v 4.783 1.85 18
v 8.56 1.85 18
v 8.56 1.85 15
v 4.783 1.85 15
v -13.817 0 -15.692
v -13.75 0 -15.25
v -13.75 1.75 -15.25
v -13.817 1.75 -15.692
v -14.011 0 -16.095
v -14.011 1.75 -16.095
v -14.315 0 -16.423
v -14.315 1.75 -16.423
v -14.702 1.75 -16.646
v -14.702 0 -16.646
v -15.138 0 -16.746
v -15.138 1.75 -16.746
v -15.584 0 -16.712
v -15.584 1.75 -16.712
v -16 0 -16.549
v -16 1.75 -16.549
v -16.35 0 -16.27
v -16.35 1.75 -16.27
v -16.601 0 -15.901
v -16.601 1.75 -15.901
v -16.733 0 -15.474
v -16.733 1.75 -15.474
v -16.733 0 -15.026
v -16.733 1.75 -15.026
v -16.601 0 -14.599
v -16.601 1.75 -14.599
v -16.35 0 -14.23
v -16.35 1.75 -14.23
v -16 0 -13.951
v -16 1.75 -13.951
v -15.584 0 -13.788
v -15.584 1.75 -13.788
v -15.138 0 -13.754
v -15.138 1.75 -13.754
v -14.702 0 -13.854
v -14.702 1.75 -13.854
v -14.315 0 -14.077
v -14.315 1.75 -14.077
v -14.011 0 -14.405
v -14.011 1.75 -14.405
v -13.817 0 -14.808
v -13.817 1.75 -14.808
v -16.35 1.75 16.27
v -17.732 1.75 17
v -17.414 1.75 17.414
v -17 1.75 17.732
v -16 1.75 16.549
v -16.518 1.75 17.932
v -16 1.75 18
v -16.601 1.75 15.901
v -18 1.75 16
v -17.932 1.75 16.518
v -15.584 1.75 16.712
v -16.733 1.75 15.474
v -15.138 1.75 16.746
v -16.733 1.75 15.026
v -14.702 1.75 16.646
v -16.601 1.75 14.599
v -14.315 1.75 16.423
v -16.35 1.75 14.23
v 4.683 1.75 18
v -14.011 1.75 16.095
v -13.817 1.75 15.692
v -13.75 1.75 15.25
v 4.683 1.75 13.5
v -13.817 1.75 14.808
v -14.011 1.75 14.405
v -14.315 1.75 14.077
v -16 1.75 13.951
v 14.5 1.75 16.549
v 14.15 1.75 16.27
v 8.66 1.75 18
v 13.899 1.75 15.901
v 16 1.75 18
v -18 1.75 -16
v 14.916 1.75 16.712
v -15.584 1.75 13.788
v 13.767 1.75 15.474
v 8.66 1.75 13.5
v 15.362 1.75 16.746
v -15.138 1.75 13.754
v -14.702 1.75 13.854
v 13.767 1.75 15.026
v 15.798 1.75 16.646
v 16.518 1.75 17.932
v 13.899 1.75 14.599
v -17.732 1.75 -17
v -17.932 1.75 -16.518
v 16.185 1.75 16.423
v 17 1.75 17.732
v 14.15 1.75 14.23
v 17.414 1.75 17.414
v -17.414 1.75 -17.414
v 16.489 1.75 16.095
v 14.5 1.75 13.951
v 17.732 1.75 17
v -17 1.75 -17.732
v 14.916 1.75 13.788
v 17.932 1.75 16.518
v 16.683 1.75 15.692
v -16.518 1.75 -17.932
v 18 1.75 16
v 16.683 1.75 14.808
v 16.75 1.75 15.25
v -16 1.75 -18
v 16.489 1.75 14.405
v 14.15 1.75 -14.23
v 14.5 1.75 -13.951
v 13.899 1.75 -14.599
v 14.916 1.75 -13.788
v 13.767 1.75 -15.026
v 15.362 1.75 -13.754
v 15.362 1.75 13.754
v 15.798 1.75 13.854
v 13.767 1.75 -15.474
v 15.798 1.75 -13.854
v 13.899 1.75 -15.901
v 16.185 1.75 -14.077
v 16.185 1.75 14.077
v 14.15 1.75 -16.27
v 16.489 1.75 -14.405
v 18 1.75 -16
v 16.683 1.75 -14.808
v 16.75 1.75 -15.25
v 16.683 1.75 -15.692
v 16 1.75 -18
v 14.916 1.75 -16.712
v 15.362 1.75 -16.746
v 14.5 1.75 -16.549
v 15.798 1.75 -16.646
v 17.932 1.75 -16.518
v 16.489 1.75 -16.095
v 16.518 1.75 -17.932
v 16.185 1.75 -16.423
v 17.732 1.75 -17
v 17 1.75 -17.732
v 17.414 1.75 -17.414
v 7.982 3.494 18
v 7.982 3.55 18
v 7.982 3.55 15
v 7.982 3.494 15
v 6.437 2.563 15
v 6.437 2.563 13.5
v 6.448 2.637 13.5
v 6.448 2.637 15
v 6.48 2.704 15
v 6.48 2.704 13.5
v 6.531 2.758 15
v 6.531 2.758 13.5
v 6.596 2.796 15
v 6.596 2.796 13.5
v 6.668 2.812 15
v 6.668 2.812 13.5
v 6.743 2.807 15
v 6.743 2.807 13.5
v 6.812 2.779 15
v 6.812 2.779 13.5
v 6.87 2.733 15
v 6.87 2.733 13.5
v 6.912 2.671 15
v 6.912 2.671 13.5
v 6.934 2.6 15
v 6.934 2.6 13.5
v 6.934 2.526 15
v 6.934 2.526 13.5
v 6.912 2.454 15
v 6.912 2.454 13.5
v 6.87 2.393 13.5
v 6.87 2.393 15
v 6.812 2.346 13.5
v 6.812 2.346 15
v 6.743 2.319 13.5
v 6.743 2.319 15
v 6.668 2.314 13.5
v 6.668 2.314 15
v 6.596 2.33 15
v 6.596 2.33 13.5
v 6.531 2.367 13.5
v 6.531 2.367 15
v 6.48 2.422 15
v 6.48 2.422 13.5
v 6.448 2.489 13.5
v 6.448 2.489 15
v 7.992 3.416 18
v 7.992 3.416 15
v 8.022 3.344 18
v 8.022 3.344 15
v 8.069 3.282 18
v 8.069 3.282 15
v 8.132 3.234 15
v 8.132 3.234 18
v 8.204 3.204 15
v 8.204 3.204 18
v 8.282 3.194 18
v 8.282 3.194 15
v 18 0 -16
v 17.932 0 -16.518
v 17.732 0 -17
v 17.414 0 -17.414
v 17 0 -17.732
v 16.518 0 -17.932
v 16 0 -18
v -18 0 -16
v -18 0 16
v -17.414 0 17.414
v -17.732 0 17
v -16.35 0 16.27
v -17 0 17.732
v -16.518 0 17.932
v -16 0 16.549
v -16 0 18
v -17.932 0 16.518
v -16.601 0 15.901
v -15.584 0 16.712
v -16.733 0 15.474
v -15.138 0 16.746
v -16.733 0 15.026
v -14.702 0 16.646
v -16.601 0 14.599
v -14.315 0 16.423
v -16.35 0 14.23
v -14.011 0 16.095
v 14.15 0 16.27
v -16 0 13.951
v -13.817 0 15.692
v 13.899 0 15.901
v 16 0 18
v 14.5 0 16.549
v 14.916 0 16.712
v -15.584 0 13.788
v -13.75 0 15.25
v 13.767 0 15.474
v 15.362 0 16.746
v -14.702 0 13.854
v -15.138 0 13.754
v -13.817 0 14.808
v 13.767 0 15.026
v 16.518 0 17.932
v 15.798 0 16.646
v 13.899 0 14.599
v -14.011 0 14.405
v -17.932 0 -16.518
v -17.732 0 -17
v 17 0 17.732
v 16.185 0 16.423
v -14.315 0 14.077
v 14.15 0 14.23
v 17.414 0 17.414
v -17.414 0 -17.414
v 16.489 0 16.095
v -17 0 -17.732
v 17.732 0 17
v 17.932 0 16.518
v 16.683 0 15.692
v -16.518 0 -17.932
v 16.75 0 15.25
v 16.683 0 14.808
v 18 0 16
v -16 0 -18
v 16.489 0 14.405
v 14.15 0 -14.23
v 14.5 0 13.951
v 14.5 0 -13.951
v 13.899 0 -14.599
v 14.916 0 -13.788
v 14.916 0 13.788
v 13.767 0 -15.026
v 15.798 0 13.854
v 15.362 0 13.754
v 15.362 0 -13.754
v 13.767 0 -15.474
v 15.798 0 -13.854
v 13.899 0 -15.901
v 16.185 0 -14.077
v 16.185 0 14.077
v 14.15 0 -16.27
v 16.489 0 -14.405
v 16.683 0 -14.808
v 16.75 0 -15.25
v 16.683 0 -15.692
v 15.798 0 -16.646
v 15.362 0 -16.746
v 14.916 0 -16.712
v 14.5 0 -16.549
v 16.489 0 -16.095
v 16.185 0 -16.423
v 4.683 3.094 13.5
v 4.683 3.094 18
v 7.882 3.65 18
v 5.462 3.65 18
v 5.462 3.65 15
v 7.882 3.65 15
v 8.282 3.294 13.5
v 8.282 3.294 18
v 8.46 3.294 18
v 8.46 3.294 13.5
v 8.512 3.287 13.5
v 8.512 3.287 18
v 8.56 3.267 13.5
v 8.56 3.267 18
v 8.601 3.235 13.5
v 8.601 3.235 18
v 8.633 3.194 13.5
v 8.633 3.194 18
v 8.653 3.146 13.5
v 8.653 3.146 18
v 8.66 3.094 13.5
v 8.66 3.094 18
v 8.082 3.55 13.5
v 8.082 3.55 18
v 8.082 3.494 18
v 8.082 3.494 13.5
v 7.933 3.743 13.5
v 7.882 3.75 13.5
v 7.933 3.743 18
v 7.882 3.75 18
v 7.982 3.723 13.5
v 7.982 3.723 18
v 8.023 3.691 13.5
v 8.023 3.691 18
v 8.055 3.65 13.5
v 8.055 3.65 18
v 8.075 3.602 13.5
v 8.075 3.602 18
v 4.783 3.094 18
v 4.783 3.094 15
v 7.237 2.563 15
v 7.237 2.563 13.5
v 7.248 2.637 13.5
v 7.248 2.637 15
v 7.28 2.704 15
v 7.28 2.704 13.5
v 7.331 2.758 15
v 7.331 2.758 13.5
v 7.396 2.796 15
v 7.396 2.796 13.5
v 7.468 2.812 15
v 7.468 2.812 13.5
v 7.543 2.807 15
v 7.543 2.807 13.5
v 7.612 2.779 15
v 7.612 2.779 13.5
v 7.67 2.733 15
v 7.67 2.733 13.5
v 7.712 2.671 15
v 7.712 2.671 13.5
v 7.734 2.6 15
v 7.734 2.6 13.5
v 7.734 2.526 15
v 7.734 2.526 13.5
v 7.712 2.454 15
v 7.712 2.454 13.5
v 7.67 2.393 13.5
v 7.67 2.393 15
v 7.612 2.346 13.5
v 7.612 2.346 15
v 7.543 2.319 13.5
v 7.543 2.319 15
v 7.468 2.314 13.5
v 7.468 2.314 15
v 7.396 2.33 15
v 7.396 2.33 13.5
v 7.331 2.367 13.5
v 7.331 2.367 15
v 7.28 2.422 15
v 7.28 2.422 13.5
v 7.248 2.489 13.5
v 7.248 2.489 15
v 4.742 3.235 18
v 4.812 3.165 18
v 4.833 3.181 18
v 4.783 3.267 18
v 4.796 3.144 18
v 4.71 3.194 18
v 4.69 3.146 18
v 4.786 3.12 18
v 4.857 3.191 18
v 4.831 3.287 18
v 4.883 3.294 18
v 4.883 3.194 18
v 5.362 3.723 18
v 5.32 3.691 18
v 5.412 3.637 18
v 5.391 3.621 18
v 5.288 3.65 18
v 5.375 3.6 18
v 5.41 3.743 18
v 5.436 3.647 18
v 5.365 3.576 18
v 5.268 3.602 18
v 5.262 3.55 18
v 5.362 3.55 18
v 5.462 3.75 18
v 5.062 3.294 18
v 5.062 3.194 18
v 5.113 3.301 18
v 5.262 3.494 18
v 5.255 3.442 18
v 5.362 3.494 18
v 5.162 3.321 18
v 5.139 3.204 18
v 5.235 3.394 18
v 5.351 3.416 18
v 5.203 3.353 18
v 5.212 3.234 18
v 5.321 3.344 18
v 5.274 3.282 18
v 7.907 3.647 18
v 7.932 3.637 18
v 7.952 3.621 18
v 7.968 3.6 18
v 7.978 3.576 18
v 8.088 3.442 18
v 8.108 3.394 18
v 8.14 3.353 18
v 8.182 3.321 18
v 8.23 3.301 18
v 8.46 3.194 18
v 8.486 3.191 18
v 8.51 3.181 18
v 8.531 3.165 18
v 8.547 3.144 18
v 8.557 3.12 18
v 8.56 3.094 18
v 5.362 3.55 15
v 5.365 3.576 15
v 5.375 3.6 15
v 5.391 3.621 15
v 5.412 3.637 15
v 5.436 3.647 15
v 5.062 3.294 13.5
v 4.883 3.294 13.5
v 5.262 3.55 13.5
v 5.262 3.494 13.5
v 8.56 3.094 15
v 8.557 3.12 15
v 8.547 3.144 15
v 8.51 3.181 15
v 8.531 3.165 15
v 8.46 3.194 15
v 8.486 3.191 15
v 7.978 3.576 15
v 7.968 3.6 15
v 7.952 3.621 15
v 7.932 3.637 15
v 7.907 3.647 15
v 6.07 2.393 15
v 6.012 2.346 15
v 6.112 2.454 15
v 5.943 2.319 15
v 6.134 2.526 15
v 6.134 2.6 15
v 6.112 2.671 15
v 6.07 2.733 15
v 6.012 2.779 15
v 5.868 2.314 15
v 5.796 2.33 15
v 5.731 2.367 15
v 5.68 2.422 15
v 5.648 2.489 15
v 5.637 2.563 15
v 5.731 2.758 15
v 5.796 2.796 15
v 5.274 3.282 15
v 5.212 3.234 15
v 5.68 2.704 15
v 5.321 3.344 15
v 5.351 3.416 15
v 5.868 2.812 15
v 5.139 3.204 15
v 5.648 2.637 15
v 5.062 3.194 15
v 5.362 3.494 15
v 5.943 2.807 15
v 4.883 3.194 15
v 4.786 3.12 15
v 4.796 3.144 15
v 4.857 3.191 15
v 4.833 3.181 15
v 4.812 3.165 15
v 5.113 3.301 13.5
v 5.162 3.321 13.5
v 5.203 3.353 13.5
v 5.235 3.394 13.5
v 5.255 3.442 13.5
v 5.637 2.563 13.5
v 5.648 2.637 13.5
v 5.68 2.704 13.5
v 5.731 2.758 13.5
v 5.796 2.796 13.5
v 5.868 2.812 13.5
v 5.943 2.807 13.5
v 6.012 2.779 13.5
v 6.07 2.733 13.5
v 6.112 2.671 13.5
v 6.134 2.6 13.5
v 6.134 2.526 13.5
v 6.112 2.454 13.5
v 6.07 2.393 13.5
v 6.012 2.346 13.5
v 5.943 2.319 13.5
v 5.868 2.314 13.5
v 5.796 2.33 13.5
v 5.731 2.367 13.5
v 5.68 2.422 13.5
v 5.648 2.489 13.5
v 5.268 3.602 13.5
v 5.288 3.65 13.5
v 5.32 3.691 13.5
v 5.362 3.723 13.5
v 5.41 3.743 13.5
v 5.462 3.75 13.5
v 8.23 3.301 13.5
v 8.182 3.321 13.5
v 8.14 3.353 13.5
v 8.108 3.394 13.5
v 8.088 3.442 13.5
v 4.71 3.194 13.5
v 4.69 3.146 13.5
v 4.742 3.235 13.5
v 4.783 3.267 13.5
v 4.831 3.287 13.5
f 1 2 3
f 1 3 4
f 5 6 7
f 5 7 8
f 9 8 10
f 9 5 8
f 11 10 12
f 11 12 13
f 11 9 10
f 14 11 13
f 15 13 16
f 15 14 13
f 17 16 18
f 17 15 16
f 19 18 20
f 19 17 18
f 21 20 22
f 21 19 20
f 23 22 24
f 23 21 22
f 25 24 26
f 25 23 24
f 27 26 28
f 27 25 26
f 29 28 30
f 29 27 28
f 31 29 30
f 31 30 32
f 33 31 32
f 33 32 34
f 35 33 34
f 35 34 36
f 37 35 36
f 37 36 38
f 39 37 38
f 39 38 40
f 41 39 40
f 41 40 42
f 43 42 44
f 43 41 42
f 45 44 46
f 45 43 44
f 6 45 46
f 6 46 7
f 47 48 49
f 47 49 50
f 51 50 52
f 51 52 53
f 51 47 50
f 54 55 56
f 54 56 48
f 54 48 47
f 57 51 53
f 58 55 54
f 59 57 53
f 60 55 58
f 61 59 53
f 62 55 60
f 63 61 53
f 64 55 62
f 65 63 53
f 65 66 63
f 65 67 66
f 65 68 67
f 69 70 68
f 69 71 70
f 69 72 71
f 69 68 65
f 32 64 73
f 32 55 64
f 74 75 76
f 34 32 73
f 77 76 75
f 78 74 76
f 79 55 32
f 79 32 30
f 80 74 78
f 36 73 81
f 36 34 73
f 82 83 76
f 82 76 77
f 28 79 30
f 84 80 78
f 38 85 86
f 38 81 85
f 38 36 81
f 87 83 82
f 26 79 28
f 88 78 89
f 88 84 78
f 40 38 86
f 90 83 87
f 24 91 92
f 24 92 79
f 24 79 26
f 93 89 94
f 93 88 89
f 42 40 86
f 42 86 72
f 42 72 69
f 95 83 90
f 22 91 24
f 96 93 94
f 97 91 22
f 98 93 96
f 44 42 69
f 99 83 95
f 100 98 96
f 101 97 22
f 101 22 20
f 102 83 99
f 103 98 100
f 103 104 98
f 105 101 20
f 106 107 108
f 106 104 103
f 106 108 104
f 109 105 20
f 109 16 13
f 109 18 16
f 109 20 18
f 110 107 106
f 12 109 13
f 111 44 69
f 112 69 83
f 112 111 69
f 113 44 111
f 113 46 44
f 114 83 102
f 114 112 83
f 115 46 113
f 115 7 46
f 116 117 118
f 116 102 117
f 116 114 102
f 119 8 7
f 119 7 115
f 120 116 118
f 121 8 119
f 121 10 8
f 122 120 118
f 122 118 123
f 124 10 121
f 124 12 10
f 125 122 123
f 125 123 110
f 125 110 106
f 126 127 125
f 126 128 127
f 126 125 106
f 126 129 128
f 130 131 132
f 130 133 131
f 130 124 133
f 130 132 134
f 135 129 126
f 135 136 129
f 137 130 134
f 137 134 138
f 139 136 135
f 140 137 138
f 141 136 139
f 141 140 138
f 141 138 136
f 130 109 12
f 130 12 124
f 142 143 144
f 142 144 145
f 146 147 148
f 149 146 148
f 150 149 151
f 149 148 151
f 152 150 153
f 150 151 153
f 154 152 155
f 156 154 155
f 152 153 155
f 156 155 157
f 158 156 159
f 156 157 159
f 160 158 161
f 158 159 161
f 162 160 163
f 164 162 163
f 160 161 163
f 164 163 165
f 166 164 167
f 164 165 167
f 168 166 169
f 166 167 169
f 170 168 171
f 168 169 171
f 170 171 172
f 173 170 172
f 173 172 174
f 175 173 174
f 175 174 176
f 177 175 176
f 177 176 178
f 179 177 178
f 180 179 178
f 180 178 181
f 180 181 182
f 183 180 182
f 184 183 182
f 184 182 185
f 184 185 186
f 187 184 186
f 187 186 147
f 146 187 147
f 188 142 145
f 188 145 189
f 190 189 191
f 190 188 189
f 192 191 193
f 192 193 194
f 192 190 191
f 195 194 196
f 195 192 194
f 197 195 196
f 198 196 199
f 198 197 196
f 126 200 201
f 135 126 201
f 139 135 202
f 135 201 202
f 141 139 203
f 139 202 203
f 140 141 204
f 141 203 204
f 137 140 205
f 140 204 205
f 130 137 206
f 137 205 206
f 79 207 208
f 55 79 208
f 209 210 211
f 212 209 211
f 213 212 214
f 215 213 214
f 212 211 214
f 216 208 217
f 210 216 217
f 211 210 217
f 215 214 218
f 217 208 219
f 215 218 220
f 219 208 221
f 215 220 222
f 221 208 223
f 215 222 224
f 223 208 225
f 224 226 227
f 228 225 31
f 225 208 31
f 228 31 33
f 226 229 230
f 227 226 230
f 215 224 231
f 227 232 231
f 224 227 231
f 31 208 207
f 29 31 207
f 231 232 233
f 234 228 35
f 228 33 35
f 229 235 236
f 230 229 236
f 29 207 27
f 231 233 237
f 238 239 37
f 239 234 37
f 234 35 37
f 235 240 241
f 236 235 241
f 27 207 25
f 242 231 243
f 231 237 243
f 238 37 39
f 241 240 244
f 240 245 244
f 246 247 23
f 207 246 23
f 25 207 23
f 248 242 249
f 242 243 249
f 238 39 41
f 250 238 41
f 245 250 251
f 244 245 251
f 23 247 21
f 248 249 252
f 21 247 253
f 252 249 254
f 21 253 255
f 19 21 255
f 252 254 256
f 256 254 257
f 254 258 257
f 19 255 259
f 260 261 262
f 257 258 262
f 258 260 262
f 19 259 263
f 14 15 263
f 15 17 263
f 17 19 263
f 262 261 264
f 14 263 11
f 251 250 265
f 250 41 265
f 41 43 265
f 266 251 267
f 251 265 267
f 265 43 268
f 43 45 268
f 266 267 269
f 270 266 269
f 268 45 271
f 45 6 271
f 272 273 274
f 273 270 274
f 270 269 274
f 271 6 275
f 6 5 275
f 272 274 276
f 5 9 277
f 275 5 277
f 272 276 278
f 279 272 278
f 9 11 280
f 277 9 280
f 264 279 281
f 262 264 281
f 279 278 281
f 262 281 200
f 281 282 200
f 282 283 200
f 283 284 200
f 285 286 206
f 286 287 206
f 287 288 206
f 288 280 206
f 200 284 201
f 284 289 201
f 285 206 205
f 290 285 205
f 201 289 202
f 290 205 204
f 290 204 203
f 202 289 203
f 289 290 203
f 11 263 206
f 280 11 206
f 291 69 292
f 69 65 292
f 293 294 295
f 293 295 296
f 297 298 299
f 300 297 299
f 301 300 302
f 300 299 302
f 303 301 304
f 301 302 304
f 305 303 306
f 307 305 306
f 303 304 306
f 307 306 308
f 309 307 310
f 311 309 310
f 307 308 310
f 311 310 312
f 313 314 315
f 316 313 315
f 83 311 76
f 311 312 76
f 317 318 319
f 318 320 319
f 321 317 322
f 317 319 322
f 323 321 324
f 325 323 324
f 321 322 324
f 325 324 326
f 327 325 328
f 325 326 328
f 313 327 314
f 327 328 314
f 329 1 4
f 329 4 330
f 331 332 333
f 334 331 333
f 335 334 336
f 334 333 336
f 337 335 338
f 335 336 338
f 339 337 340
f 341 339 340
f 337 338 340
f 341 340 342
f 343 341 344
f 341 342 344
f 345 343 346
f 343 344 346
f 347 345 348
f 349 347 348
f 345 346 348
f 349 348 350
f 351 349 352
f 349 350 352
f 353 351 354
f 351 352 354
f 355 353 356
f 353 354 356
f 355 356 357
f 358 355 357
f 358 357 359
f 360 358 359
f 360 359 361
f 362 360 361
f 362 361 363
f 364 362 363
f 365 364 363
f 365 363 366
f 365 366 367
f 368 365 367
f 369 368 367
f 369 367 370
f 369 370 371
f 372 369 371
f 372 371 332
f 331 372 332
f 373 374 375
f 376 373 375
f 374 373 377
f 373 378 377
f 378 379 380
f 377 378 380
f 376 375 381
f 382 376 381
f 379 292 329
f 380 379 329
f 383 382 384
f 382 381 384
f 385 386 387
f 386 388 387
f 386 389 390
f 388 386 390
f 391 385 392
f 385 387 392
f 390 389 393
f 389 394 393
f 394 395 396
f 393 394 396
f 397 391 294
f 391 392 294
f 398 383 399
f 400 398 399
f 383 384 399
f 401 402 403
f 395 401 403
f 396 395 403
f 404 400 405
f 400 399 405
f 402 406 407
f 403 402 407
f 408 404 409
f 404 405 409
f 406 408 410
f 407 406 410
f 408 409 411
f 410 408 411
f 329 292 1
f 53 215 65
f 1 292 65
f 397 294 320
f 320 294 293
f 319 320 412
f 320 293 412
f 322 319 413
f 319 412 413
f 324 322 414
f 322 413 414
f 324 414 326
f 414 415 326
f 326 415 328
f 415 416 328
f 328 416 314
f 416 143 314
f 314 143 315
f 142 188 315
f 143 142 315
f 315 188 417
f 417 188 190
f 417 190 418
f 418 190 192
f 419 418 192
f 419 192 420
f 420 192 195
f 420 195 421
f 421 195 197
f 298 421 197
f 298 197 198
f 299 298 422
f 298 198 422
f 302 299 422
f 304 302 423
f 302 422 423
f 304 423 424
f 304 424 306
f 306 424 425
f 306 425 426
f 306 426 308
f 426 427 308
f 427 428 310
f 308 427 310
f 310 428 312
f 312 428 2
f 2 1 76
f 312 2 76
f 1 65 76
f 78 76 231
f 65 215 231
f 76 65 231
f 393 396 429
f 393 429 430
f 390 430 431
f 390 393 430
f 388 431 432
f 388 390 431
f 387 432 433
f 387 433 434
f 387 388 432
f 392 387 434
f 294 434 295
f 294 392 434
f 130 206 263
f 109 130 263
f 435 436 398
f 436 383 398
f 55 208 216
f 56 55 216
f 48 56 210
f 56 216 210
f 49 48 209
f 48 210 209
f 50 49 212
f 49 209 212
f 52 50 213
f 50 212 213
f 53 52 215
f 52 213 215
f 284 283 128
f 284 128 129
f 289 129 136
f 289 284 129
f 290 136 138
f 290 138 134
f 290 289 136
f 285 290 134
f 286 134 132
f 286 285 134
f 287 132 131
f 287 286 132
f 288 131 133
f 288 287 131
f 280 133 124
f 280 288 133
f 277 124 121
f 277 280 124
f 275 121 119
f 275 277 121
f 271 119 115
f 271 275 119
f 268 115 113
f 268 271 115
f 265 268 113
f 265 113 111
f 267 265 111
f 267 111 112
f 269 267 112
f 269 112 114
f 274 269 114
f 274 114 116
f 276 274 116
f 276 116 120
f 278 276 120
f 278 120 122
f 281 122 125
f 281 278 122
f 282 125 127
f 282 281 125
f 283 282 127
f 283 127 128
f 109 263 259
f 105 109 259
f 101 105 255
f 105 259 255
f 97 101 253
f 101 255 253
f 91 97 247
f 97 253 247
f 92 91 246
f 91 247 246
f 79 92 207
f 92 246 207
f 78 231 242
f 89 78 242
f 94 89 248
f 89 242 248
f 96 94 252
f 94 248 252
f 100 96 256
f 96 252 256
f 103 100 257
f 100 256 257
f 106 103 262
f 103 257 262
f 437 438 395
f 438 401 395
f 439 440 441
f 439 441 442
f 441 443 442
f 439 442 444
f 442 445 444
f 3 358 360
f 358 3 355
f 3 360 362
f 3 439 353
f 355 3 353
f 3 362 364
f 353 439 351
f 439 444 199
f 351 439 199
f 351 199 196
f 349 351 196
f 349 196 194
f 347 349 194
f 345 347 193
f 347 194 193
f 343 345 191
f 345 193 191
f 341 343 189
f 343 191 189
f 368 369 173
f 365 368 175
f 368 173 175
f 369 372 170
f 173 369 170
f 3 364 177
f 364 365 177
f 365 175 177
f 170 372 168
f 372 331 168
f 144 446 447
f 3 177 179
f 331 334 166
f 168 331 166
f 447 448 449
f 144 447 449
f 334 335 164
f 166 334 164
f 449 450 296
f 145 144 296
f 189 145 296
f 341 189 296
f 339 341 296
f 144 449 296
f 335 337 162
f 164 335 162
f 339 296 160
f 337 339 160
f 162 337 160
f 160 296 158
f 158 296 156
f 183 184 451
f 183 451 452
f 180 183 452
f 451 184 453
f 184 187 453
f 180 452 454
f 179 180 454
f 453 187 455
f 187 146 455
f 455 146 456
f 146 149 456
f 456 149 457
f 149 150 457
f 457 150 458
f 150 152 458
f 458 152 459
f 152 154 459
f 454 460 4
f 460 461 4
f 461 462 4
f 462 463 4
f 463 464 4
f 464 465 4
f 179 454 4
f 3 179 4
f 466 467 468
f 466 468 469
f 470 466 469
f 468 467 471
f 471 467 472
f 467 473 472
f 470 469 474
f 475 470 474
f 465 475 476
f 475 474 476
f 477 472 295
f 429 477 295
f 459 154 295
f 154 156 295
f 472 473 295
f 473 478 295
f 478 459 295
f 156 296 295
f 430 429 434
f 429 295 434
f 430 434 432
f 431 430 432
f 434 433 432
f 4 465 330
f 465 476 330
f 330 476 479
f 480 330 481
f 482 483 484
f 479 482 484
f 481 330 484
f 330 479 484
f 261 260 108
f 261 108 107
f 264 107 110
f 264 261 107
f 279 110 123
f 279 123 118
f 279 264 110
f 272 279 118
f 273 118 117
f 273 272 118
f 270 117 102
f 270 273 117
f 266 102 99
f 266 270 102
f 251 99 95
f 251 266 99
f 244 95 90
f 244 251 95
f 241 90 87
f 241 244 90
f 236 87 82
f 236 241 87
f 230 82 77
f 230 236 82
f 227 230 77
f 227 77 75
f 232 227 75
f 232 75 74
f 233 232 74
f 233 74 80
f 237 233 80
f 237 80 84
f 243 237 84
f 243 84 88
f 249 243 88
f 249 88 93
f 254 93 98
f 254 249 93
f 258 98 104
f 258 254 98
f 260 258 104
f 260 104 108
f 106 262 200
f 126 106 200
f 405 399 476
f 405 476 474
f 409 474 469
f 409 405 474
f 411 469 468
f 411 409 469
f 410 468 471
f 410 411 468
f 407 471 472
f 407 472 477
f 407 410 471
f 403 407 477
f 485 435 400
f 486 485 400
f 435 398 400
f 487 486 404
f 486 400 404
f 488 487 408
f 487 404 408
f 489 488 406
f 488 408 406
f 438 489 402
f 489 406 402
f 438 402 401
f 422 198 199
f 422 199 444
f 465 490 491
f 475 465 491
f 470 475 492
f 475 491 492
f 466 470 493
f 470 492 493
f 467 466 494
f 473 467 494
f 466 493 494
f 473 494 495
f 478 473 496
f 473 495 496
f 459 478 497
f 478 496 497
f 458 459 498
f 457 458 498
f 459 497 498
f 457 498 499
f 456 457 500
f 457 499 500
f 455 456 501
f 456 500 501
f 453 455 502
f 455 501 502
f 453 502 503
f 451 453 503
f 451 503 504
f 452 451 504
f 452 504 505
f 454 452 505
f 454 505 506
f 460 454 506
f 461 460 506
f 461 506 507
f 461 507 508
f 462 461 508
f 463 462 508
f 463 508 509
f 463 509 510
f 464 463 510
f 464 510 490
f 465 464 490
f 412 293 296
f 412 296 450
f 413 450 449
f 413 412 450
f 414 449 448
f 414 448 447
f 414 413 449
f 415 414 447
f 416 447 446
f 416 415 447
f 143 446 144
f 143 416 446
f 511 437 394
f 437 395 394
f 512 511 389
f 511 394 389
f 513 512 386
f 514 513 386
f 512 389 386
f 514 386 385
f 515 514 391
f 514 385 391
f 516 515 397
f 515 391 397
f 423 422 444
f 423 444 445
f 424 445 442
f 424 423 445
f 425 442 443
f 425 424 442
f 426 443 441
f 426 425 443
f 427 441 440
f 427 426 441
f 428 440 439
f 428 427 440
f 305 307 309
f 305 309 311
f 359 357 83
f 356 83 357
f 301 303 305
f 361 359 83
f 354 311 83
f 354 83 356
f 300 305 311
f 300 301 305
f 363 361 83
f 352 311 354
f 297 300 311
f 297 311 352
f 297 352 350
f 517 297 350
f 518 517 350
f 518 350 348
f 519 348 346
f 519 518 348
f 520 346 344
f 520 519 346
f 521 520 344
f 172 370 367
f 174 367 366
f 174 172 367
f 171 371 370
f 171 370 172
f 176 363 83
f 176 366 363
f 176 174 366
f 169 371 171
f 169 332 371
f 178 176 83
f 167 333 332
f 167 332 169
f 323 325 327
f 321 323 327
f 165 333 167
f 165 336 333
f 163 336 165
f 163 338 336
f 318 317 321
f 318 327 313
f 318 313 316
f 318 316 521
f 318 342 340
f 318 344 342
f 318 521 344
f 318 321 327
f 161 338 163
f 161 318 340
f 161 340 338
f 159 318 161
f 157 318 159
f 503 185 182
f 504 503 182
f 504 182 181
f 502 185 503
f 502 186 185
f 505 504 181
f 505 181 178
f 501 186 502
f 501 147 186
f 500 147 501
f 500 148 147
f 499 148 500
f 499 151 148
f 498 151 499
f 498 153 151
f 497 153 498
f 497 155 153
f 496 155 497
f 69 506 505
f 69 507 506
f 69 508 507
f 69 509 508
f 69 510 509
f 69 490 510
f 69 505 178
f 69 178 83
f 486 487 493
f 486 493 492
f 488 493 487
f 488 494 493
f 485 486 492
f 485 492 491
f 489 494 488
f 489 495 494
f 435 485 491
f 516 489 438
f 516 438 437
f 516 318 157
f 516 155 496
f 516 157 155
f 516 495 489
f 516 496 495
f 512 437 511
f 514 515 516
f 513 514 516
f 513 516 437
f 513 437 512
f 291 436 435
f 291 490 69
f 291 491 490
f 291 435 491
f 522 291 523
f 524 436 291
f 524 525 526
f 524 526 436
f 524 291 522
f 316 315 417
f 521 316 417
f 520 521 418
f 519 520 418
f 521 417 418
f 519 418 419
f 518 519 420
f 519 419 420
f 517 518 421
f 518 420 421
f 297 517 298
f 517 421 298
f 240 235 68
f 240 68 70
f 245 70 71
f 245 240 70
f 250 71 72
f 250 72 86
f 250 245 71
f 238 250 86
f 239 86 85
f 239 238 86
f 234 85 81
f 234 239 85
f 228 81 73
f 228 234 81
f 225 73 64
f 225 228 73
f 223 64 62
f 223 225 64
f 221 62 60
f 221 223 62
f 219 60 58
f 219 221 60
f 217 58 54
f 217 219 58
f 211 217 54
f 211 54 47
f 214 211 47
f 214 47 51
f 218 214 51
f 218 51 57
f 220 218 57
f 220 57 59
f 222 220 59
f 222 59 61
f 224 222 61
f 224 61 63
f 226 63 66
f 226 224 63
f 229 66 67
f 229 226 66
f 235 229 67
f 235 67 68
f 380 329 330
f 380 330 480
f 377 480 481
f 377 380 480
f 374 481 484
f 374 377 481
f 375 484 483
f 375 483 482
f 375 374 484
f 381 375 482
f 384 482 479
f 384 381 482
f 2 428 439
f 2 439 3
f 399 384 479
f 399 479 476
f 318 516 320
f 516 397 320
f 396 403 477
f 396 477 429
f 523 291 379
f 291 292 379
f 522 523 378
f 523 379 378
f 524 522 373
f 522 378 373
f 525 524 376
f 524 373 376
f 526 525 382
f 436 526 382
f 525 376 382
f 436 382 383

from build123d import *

# Parameters (mm, degrees)
SKETCH1_R           = 1.5
BOSS_EXTRUDE1_DEPTH = 1.75
BOSS_DEPTH          = 3
BOSS_EXTRUDE5_DEPTH = 1.5
SKETCH10_R          = 0.25
CUT_EXTRUDE2_DEPTH  = 5.5


with BuildPart() as part:
    # Sketch1 → Boss-Extrude1 (new body)
    with BuildSketch(Plane(origin=(0, 0, 0), x_dir=(1, 0, 0), z_dir=(0, 1, 0))):
        with BuildLine():
            Line((-16, -18), (16, -18))
            ThreePointArc((16, -18), (17.414213562, -17.414213562), (18, -16))
            Line((18, -16), (18, 16))
            ThreePointArc((18, 16), (17.414213562, 17.414213562), (16, 18))
            Line((16, 18), (-16, 18))
            ThreePointArc((-16, 18), (-17.414213562, 17.414213562), (-18, 16))
            Line((-18, 16), (-18, -16))
            ThreePointArc((-18, -16), (-17.414213562, -17.414213562), (-16, -18))
        make_face()
        with Locations((-15.25, 15.25)):
            Circle(SKETCH1_R, mode=Mode.SUBTRACT)
        with Locations((15.25, 15.25)):
            Circle(SKETCH1_R, mode=Mode.SUBTRACT)
        with Locations((-15.25, -15.25)):
            Circle(SKETCH1_R, mode=Mode.SUBTRACT)
        with Locations((15.25, -15.25)):
            Circle(SKETCH1_R, mode=Mode.SUBTRACT)
    extrude(amount=BOSS_EXTRUDE1_DEPTH)

    # Sketch2 → Boss- (add)
    with BuildSketch(Plane.XY.offset(18)):
        with BuildLine():
            Line((4.683071404, 1.75), (8.659974309, 1.75))
            Line((8.659974309, 1.75), (8.659974309, 3.094003243))
            ThreePointArc((8.659974309, 3.094003243), (8.601395665, 3.235424599), (8.459974309, 3.294003243))
            Line((8.459974309, 3.294003243), (8.281537536, 3.294003243))
            ThreePointArc((8.281537536, 3.294003243), (8.14011618, 3.352581887), (8.081537536, 3.494003243))
            Line((8.081537536, 3.494003243), (8.081537536, 3.55))
            ThreePointArc((8.081537536, 3.55), (8.022958893, 3.691421356), (7.881537536, 3.75))
            Line((7.881537536, 3.75), (5.461508176, 3.75))
            ThreePointArc((5.461508176, 3.75), (5.32008682, 3.691421356), (5.261508176, 3.55))
            Line((5.261508176, 3.55), (5.261508176, 3.494003243))
            ThreePointArc((5.261508176, 3.494003243), (5.202929533, 3.352581887), (5.061508176, 3.294003243))
            Line((5.061508176, 3.294003243), (4.883071404, 3.294003243))
            ThreePointArc((4.883071404, 3.294003243), (4.741650048, 3.235424599), (4.683071404, 3.094003243))
            Line((4.683071404, 3.094003243), (4.683071404, 1.75))
        make_face()
        with BuildLine():
            Line((4.783071404, 1.85), (4.783071404, 3.094003243))
            ThreePointArc((4.783071404, 3.094003243), (4.812360726, 3.164713921), (4.883071404, 3.194003243))
            Line((4.883071404, 3.194003243), (5.061508176, 3.194003243))
            ThreePointArc((5.061508176, 3.194003243), (5.273640211, 3.281871209), (5.361508176, 3.494003243))
            Line((5.361508176, 3.494003243), (5.361508176, 3.55))
            ThreePointArc((5.361508176, 3.55), (5.390797498, 3.620710678), (5.461508176, 3.65))
            Line((5.461508176, 3.65), (7.881537536, 3.65))
            ThreePointArc((7.881537536, 3.65), (7.952248214, 3.620710678), (7.981537536, 3.55))
            Line((7.981537536, 3.55), (7.981537536, 3.494003243))
            ThreePointArc((7.981537536, 3.494003243), (8.069405502, 3.281871209), (8.281537536, 3.194003243))
            Line((8.281537536, 3.194003243), (8.459974309, 3.194003243))
            ThreePointArc((8.459974309, 3.194003243), (8.530684987, 3.164713921), (8.559974309, 3.094003243))
            Line((8.559974309, 3.094003243), (8.559974309, 1.85))
            Line((8.559974309, 1.85), (4.783071404, 1.85))
        make_face(mode=Mode.SUBTRACT)
    extrude(amount=-BOSS_DEPTH)

    # Sketch9 → Boss-Extrude5 (add)
    with BuildSketch(Plane(origin=(0, 0, 15), x_dir=(-1, 0, 0), z_dir=(0, 0, -1))):
        with BuildLine():
            Line((-8.281537536, 3.294003243), (-8.459974309, 3.294003243))
            ThreePointArc((-8.459974309, 3.294003243), (-8.601395665, 3.235424599), (-8.659974309, 3.094003243))
            Line((-8.659974309, 3.094003243), (-8.659974309, 1.75))
            Line((-8.659974309, 1.75), (-4.683071404, 1.75))
            Line((-4.683071404, 1.75), (-4.683071404, 3.094003243))
            ThreePointArc((-4.683071404, 3.094003243), (-4.741650048, 3.235424599), (-4.883071404, 3.294003243))
            Line((-4.883071404, 3.294003243), (-5.061508176, 3.294003243))
            ThreePointArc((-5.061508176, 3.294003243), (-5.202929533, 3.352581887), (-5.261508176, 3.494003243))
            Line((-5.261508176, 3.494003243), (-5.261508176, 3.55))
            ThreePointArc((-5.261508176, 3.55), (-5.32008682, 3.691421356), (-5.461508176, 3.75))
            Line((-5.461508176, 3.75), (-7.881537536, 3.75))
            ThreePointArc((-7.881537536, 3.75), (-8.022958893, 3.691421356), (-8.081537536, 3.55))
            Line((-8.081537536, 3.55), (-8.081537536, 3.494003243))
            ThreePointArc((-8.081537536, 3.494003243), (-8.14011618, 3.352581887), (-8.281537536, 3.294003243))
        make_face()
    extrude(amount=BOSS_EXTRUDE5_DEPTH)

    # Sketch10 → Cut-Extrude2 (cut, through all)
    with BuildSketch(Plane(origin=(0, 0, 13.5), x_dir=(-1, 0, 0), z_dir=(0, 0, -1))):
        with Locations((-6.686931658, 2.562814542)):
            Circle(SKETCH10_R)
        with Locations((-5.886931658, 2.562814542)):
            Circle(SKETCH10_R)
        with Locations((-7.486931658, 2.562814542)):
            Circle(SKETCH10_R)
    extrude(amount=-CUT_EXTRUDE2_DEPTH, mode=Mode.SUBTRACT)


solid = part.part
